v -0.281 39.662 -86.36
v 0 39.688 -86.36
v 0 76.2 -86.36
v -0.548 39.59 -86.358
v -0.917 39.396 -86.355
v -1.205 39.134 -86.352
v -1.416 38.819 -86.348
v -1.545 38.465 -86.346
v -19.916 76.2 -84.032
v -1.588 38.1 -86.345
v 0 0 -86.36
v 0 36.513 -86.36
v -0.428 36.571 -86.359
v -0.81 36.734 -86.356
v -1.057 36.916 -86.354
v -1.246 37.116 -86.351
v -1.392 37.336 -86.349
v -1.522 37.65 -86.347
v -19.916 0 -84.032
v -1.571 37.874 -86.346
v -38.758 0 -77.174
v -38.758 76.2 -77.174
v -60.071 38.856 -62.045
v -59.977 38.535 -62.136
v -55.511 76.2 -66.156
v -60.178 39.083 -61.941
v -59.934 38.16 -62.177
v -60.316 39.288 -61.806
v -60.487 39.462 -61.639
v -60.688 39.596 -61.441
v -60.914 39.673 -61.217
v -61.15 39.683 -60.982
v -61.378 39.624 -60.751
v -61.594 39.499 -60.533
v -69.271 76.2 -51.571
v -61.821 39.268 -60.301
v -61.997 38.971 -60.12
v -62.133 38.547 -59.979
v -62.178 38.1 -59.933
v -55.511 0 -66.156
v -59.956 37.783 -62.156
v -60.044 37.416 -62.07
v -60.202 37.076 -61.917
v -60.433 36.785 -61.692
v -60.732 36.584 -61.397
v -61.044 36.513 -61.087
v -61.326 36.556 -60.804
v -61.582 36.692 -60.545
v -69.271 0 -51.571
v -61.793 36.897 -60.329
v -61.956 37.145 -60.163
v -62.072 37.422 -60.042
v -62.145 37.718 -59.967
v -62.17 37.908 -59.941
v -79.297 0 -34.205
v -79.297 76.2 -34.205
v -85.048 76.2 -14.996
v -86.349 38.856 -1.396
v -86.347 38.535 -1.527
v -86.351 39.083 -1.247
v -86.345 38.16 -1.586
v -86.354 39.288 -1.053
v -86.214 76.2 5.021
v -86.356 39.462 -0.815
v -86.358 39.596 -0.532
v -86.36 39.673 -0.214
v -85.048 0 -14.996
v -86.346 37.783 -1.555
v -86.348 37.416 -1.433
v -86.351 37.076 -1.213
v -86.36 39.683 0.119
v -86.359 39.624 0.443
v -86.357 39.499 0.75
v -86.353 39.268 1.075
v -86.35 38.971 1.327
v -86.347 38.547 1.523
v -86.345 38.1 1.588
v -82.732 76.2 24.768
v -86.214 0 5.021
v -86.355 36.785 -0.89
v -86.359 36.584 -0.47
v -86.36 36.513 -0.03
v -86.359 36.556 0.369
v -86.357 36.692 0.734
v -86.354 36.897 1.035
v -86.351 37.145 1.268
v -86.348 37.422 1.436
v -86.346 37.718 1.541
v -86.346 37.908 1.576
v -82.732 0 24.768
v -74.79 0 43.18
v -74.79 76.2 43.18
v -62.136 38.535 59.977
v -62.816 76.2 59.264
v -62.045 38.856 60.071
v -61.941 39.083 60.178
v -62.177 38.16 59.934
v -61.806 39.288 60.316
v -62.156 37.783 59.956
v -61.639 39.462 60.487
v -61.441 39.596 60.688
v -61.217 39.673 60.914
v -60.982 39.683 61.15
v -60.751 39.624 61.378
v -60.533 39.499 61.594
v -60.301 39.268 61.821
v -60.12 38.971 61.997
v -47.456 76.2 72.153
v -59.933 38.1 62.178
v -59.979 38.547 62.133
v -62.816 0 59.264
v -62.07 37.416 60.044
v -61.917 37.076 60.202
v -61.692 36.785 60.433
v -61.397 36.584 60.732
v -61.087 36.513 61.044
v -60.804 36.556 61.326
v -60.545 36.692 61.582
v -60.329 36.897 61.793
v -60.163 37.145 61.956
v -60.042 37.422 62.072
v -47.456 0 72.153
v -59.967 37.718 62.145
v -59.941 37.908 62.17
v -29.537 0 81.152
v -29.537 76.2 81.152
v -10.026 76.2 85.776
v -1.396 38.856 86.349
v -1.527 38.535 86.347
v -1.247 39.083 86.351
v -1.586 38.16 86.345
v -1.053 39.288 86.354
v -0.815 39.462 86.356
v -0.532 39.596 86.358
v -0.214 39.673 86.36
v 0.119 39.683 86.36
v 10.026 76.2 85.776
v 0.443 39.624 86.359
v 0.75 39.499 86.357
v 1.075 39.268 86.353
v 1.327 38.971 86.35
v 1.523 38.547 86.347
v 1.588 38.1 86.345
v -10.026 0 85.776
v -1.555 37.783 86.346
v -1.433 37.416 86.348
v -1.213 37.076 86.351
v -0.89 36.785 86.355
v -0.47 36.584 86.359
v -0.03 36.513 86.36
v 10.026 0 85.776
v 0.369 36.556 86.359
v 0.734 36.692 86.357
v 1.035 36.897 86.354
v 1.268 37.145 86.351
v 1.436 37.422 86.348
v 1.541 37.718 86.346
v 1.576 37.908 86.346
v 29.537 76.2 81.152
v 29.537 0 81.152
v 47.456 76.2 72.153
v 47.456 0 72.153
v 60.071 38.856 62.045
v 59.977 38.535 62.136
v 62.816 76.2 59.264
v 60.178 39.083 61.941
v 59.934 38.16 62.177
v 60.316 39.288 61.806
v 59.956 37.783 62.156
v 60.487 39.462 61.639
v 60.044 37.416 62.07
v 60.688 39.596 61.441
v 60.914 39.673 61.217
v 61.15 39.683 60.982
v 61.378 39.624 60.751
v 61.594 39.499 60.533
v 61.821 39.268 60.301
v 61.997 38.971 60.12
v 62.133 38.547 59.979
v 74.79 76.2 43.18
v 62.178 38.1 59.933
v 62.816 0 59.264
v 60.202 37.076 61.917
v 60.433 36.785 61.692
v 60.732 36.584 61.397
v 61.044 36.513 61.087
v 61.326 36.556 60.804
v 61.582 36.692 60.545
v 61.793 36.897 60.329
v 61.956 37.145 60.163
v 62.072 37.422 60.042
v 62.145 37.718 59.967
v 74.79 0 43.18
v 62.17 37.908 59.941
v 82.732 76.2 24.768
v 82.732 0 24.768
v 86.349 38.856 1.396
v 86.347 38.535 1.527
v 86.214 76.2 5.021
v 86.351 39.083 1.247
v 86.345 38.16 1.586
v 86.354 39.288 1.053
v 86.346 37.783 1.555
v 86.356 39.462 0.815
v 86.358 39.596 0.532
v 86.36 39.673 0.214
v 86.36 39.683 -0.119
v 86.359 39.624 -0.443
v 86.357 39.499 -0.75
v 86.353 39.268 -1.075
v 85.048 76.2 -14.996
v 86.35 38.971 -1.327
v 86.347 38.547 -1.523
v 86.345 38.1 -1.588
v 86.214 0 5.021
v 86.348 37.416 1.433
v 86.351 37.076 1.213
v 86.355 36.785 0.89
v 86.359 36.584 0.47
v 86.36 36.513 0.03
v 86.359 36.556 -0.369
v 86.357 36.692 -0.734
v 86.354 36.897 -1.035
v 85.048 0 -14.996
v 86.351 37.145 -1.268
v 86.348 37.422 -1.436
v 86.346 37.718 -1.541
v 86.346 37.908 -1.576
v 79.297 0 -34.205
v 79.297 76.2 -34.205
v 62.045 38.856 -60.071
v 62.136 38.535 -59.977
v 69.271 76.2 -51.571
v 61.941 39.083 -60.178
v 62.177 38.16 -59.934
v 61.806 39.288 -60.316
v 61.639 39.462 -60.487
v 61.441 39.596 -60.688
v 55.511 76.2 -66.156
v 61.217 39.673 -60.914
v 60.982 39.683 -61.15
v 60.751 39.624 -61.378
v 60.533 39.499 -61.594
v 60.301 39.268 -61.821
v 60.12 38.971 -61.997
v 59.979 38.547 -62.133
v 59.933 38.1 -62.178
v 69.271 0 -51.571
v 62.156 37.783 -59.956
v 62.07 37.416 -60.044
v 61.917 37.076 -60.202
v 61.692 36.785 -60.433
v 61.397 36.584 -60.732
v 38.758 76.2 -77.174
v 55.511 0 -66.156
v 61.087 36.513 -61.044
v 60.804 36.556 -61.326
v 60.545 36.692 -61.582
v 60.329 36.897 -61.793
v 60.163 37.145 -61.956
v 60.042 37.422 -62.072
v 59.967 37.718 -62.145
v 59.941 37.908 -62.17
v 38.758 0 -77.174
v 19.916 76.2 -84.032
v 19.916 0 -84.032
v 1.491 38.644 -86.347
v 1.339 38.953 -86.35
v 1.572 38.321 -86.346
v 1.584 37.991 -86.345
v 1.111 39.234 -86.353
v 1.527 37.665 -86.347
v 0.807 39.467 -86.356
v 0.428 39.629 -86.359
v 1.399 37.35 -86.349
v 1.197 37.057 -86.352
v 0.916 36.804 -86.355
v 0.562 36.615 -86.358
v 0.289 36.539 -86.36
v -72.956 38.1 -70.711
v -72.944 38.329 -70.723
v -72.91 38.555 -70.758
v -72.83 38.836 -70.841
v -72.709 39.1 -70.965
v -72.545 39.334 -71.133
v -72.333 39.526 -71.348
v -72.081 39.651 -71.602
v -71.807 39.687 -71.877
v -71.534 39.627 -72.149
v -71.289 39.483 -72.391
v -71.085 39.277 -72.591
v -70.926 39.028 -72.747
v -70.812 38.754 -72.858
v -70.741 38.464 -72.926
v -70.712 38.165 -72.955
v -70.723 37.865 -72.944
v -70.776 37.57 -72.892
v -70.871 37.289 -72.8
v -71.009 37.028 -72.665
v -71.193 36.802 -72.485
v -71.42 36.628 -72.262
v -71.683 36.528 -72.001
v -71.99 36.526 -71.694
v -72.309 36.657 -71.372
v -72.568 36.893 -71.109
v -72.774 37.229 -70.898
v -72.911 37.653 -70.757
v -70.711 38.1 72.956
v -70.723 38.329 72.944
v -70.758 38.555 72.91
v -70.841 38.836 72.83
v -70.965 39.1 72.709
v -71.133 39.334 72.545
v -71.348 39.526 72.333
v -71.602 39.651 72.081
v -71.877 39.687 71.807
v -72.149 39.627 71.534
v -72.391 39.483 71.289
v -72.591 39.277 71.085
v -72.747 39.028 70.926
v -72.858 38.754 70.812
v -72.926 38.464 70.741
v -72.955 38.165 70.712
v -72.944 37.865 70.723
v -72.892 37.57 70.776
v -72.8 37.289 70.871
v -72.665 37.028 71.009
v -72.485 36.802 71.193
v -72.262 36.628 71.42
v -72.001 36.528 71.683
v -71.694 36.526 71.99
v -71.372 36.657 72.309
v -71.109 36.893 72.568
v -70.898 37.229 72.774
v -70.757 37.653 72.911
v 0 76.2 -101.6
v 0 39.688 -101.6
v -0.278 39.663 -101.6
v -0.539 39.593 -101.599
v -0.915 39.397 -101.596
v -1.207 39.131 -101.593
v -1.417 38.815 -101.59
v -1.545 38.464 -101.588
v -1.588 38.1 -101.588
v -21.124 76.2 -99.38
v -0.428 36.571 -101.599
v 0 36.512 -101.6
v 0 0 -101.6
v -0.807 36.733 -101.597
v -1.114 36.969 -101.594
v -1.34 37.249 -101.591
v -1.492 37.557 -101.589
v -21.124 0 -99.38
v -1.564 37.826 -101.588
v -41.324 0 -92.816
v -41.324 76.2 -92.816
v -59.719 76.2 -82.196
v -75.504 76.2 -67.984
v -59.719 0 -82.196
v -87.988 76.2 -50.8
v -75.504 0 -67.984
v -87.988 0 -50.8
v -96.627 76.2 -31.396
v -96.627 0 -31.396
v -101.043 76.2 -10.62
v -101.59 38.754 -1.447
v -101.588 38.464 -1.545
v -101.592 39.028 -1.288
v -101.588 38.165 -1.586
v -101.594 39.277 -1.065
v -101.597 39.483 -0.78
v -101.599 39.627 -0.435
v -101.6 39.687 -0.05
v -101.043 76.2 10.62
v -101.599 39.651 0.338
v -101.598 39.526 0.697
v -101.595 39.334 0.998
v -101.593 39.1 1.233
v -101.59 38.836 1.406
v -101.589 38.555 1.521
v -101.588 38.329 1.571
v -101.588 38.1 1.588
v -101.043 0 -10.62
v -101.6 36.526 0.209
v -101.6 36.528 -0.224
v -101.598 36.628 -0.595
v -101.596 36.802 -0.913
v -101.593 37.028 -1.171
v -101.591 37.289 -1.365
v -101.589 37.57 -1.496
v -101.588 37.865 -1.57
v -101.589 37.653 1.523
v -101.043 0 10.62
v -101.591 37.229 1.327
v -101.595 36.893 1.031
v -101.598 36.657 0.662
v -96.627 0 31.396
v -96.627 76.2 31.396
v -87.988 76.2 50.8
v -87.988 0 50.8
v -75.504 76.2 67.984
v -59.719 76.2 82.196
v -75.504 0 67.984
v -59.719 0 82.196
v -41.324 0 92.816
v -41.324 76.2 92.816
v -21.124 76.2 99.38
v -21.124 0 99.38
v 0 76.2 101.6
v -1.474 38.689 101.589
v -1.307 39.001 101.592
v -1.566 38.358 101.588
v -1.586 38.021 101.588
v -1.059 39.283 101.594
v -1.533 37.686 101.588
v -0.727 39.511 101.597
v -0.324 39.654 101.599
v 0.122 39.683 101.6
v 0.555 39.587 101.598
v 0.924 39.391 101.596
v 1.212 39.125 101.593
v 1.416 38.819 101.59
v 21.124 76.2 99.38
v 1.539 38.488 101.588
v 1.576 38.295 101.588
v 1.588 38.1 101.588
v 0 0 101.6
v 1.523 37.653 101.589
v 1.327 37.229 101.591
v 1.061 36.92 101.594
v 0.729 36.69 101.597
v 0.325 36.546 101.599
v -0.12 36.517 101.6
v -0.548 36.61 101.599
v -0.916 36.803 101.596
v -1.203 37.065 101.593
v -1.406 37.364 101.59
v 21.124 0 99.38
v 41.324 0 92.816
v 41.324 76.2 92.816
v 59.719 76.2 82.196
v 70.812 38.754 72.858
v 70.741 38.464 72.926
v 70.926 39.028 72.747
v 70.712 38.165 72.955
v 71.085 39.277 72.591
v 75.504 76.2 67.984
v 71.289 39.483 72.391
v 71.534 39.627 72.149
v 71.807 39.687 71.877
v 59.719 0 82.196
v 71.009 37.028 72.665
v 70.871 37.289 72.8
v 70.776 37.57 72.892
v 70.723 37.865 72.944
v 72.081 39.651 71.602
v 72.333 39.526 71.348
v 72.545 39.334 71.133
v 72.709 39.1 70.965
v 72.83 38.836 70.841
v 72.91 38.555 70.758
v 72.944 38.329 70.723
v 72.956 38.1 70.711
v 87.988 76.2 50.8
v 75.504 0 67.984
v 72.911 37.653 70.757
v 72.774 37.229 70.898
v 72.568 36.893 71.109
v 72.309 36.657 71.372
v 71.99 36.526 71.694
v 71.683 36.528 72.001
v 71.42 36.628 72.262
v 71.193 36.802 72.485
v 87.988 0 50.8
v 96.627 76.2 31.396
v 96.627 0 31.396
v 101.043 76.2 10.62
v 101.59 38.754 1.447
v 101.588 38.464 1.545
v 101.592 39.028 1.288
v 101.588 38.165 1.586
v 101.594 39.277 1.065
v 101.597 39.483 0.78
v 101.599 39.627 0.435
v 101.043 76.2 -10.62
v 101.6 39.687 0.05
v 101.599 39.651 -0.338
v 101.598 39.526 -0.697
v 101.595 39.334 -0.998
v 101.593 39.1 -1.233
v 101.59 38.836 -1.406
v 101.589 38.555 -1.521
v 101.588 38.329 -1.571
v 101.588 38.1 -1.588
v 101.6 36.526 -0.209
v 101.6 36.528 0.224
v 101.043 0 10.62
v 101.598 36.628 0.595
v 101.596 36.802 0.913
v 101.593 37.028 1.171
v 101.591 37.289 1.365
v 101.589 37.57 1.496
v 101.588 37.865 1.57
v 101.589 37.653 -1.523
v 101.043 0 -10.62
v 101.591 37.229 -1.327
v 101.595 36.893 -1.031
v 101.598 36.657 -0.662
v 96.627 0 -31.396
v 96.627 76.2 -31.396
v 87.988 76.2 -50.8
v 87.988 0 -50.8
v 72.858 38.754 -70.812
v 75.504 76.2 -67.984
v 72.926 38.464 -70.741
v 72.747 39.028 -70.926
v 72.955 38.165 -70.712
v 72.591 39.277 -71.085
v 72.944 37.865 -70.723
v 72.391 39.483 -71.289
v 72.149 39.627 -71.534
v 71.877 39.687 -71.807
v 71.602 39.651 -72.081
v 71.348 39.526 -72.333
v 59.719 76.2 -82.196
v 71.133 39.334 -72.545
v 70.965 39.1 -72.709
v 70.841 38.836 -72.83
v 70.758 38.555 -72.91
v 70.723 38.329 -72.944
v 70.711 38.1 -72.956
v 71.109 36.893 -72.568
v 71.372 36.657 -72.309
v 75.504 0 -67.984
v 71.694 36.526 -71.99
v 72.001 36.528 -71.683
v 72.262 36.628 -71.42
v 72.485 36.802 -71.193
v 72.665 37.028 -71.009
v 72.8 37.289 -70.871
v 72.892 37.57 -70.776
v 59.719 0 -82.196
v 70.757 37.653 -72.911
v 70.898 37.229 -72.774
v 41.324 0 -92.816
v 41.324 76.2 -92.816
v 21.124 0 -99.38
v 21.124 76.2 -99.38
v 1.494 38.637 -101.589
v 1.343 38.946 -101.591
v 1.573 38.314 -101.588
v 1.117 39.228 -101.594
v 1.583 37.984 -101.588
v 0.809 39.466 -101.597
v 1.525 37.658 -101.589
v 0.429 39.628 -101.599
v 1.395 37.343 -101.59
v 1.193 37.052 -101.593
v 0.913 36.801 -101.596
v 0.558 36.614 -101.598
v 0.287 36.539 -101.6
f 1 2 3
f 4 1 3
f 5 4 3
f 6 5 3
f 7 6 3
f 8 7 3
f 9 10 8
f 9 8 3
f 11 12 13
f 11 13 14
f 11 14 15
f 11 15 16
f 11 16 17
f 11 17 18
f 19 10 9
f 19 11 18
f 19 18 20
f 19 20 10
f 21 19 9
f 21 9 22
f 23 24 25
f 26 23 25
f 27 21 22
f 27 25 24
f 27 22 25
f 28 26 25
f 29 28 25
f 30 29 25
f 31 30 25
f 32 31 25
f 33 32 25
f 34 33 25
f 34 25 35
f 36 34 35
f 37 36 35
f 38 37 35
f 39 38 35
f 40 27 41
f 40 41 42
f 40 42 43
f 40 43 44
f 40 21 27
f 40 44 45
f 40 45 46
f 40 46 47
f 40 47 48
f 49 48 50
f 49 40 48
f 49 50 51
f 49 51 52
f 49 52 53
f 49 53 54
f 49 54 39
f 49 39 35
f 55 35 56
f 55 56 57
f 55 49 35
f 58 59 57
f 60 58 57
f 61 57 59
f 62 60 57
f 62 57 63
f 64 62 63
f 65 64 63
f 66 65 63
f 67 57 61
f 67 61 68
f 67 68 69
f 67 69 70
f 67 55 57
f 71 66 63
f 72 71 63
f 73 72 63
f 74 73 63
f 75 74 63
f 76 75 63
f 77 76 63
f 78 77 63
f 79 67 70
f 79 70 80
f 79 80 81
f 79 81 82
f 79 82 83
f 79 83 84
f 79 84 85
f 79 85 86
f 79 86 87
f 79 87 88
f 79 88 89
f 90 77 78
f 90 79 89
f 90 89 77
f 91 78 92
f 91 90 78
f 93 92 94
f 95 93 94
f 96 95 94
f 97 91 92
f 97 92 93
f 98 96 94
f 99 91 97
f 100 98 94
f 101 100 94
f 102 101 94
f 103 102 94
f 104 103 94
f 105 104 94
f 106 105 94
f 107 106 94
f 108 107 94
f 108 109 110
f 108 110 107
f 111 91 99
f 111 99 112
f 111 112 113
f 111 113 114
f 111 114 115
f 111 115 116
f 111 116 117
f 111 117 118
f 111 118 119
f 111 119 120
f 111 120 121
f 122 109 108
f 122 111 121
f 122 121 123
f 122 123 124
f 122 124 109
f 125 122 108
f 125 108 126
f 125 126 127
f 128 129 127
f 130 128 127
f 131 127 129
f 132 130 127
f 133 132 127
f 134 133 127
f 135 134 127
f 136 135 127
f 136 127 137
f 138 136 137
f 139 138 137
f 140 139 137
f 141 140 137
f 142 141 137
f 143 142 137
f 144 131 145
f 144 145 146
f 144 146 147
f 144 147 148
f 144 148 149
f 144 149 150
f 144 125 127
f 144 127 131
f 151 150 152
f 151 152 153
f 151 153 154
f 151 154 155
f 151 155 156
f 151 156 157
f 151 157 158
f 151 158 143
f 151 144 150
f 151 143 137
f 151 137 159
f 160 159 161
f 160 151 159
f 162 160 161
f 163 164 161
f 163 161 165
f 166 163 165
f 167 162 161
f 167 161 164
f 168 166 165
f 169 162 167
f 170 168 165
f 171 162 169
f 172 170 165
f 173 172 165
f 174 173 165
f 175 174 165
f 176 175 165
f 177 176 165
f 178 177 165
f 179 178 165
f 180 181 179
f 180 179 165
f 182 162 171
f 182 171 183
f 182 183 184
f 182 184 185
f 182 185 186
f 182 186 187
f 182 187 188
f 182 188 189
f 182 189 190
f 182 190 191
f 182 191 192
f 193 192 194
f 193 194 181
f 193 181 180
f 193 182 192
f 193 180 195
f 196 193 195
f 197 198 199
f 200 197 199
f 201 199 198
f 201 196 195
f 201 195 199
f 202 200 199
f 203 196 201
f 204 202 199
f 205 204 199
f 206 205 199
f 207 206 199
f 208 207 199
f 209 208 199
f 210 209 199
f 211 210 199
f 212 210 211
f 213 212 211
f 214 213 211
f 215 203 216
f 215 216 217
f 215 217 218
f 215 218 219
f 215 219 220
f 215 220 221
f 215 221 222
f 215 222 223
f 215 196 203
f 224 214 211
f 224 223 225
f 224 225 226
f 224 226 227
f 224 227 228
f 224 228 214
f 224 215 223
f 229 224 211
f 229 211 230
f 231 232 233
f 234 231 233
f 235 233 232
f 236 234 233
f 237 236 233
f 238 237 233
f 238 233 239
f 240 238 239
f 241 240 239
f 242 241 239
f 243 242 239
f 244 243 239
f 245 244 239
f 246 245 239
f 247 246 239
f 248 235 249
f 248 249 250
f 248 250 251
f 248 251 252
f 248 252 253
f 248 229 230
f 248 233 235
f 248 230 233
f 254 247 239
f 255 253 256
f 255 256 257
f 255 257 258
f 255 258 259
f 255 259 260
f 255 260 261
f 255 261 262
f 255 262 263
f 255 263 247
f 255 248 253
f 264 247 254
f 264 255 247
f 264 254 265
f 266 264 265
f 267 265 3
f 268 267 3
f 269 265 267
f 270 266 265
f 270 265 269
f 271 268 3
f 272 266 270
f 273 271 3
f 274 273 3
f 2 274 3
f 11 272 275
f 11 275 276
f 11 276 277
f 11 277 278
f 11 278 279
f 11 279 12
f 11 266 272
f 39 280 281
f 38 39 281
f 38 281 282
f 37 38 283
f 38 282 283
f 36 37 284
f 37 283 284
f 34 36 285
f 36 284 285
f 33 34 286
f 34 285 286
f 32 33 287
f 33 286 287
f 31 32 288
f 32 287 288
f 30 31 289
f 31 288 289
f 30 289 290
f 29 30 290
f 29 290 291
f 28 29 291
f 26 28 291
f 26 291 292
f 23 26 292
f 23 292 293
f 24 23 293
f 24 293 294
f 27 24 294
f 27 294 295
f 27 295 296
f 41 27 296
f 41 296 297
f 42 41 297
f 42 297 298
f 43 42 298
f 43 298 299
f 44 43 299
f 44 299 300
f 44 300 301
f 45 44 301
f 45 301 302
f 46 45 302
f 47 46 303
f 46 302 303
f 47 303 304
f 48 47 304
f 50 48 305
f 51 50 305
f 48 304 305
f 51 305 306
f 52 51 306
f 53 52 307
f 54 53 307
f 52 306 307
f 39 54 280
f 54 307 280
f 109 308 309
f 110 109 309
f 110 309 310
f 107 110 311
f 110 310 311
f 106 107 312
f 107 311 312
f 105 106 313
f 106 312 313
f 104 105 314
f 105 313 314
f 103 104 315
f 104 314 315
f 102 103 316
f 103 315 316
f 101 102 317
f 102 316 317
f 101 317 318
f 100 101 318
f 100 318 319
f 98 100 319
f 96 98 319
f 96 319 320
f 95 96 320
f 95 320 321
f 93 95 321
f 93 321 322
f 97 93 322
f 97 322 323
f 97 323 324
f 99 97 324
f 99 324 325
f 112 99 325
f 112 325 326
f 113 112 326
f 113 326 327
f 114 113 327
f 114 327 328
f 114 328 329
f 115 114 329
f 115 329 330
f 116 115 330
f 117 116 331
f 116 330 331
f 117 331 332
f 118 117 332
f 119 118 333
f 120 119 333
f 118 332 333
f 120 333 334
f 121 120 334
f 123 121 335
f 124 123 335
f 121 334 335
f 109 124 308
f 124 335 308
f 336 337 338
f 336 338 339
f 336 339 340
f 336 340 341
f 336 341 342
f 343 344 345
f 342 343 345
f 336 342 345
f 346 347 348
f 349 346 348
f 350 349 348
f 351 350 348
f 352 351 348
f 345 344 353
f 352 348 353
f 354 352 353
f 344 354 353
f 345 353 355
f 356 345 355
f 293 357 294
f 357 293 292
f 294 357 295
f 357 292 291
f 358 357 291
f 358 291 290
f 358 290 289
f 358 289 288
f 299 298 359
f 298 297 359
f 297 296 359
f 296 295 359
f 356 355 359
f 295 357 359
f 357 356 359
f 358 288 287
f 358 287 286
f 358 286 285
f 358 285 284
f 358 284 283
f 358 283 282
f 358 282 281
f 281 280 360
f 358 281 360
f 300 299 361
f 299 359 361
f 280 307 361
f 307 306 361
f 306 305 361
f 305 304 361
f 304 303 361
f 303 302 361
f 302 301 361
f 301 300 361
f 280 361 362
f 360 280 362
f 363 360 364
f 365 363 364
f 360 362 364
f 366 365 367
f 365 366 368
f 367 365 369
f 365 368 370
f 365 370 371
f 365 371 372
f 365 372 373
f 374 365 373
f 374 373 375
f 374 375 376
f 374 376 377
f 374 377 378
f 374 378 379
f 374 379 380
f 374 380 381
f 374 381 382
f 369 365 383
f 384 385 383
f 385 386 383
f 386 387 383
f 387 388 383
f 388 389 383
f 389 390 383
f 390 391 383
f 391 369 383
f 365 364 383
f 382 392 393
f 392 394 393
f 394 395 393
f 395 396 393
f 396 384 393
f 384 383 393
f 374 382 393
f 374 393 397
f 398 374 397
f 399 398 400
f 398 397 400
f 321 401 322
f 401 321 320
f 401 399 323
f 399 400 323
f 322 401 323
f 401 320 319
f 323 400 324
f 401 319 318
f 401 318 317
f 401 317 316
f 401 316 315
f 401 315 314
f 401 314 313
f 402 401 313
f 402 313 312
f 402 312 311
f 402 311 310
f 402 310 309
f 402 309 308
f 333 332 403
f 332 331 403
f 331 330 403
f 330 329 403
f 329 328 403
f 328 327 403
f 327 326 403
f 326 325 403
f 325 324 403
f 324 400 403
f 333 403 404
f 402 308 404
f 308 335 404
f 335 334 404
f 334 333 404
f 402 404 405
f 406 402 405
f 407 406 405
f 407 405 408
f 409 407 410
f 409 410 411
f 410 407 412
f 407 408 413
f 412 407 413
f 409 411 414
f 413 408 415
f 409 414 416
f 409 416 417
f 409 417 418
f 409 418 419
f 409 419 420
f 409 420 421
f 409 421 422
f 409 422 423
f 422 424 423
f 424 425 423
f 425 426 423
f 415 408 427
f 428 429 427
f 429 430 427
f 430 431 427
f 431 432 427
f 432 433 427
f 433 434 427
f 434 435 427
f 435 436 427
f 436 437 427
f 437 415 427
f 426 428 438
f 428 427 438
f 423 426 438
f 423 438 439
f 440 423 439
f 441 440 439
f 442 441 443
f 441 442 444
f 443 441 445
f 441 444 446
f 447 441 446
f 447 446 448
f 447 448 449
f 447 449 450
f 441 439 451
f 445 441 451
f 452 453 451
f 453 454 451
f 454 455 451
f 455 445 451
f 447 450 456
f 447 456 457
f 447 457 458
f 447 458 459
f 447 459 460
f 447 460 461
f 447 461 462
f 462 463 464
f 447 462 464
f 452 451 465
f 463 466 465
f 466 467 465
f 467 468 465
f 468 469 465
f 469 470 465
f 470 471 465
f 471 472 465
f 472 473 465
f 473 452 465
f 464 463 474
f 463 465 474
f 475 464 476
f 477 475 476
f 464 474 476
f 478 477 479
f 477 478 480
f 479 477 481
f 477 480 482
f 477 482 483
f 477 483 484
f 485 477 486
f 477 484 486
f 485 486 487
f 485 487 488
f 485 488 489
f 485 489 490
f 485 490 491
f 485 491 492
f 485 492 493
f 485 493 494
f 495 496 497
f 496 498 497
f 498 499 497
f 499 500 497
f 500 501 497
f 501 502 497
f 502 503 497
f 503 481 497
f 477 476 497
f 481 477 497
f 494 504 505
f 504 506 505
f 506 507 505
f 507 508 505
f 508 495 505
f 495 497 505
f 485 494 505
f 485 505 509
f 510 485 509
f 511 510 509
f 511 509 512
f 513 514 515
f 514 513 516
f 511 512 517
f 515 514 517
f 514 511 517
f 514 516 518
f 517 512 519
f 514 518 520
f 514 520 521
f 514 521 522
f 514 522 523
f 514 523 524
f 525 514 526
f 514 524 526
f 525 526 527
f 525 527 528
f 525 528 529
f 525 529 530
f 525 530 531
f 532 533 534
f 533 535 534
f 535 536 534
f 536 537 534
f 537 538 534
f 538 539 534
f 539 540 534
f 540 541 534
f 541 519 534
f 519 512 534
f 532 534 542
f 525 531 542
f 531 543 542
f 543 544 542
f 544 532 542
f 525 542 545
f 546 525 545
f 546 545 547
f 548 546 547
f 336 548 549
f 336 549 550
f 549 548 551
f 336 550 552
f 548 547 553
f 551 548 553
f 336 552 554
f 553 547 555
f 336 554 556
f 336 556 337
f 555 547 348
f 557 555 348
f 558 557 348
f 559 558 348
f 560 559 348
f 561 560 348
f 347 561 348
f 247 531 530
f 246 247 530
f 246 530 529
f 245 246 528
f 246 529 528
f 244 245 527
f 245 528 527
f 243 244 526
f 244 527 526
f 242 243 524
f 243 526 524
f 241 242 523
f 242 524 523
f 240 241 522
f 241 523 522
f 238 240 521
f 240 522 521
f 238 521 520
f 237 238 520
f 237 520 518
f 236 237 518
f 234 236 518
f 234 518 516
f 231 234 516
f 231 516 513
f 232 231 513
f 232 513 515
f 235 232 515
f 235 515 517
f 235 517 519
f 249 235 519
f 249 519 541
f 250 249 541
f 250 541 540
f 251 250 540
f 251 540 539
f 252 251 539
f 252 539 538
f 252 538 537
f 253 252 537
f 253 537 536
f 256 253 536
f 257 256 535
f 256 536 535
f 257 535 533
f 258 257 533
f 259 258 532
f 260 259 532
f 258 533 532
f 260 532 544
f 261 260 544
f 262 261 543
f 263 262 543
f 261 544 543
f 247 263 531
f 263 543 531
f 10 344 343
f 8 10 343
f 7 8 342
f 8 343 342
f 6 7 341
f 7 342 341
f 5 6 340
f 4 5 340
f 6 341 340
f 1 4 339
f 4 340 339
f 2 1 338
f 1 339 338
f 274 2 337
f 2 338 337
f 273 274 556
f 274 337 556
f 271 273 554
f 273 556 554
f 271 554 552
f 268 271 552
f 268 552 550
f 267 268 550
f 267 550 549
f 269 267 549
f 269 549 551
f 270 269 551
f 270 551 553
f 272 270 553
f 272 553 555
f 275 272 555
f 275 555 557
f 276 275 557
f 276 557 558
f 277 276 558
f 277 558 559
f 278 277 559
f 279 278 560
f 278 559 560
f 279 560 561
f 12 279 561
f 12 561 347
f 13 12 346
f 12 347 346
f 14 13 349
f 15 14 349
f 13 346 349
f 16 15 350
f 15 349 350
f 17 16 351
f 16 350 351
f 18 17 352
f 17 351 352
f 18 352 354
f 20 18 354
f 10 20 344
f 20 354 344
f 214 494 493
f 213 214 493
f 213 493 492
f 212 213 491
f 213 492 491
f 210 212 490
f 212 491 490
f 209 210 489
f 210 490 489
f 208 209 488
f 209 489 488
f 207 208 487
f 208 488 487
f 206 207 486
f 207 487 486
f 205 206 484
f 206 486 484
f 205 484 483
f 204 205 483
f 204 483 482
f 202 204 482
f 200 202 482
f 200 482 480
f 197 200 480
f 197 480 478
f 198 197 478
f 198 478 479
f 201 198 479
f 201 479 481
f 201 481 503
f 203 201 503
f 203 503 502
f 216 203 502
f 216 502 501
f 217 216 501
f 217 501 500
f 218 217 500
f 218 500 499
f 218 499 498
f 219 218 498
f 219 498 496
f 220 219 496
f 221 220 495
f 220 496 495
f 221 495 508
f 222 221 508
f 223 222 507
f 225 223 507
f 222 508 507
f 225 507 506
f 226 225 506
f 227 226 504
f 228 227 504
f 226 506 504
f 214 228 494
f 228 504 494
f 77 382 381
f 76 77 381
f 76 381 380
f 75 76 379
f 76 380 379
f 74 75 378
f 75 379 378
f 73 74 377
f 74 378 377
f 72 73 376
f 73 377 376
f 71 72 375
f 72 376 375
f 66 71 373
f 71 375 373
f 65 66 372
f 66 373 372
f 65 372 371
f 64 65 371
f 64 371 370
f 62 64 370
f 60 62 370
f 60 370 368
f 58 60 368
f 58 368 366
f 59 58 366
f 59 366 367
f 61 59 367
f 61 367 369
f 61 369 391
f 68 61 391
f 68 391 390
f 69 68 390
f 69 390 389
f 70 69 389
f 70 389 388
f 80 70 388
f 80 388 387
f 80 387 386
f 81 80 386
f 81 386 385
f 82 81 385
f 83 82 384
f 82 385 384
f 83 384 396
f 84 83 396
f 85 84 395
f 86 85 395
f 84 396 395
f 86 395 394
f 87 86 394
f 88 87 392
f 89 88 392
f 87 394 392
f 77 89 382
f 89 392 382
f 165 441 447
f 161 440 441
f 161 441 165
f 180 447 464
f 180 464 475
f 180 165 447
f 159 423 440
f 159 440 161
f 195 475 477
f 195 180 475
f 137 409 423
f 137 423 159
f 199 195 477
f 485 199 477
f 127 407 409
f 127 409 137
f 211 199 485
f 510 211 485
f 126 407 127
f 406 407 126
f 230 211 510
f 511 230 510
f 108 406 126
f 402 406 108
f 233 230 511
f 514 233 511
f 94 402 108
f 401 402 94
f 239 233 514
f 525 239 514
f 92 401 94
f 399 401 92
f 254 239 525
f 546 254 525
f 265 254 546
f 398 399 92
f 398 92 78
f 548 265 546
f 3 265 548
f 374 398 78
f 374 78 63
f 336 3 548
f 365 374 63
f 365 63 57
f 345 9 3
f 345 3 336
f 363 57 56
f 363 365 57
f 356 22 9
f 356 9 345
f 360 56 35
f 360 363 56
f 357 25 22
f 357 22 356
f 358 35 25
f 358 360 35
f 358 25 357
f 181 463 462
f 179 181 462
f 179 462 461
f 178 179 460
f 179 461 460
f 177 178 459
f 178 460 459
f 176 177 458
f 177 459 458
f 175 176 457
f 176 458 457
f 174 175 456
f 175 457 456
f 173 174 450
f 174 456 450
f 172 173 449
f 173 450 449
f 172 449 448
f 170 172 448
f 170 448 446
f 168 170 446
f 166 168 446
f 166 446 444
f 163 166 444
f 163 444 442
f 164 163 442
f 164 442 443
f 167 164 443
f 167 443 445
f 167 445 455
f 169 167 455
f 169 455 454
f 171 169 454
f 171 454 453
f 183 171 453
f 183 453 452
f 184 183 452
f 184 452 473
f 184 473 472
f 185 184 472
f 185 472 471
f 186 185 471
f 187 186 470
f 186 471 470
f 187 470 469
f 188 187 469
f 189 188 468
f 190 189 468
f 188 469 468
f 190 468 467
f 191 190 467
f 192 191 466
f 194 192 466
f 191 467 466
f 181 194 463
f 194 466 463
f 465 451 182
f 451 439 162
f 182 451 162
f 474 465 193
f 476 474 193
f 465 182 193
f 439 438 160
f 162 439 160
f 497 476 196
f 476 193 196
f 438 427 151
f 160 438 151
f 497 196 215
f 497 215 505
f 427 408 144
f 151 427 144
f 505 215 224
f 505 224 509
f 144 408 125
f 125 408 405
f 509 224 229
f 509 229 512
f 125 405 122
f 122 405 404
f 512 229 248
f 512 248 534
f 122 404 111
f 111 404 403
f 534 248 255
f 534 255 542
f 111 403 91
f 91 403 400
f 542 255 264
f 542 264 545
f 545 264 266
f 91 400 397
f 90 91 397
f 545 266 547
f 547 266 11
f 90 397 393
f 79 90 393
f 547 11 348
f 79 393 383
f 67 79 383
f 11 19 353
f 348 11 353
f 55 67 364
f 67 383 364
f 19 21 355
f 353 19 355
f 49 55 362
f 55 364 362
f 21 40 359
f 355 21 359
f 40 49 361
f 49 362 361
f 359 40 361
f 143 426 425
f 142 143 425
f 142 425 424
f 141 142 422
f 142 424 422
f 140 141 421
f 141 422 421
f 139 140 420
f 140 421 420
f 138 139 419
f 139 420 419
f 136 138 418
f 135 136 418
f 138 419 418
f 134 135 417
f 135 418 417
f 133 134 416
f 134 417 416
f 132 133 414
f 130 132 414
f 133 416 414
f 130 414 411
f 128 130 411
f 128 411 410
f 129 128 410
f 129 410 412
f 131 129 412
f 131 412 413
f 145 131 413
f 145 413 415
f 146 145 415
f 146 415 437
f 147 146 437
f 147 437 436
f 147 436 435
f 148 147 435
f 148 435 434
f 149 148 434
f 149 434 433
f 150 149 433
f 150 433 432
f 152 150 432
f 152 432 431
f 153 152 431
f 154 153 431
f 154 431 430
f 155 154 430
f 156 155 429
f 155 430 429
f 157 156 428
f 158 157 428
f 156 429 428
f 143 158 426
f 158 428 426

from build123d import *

# Parameters (mm, degrees)
SKETCH1_R               = 101.6
SKETCH1_R_2             = 86.36
BOSS_EXTRUDE1_DEPTH     = 76.2
CUT_EXTRUDE1_REACH      = 241.623
CUT_EXTRUDE1_END_RADIUS = 86.36
SKETCH2_R               = 1.5875
CIRPATTERN1_COUNT       = 8


with BuildPart() as part:
    # Sketch1 → Boss-Extrude1 (new body)
    with BuildSketch(Plane(origin=(0, 0, 0), x_dir=(1, 0, 0), z_dir=(0, 1, 0))):
        with Locations(Location((0, 0, 0), (0, 0, 90))):
            Circle(SKETCH1_R)
        with Locations(Location((0, 0, 0), (0, 0, 90))):
            Circle(SKETCH1_R_2, mode=Mode.SUBTRACT)
    extrude(amount=BOSS_EXTRUDE1_DEPTH)

    # Cut-Extrude1: up to this cylinder (the profile starts outside it)
    cut_extrude1_end = Plane(origin=(0, 38.1, 0), z_dir=(0, -1, 0)) * Cylinder(CUT_EXTRUDE1_END_RADIUS, 656.966, mode=Mode.PRIVATE)
    # Sketch2 → Cut-Extrude1 (cut, up to the surface)
    with BuildSketch(Plane.XY.offset(101.6), mode=Mode.PRIVATE) as cut_extrude1_sk1:
        with Locations((0, 38.1)):
            Circle(SKETCH2_R)
    cut_extrude1_tool1 = extrude(cut_extrude1_sk1.sketch, amount=-CUT_EXTRUDE1_REACH, mode=Mode.PRIVATE) - cut_extrude1_end
    cut_extrude1 = cut_extrude1_tool1.solids().sort_by_distance((0, 38.1, 101.6))[0]
    add(cut_extrude1, mode=Mode.SUBTRACT)

    # CirPattern1: Cut-Extrude1 ×8 about axis
    cirpattern1_axis = Axis((0, 76.2, 0), (0, -1, 0))
    for i in range(1, CIRPATTERN1_COUNT):
        add(cut_extrude1.rotate(cirpattern1_axis, i * 360 / CIRPATTERN1_COUNT), mode=Mode.SUBTRACT)


solid = part.part
